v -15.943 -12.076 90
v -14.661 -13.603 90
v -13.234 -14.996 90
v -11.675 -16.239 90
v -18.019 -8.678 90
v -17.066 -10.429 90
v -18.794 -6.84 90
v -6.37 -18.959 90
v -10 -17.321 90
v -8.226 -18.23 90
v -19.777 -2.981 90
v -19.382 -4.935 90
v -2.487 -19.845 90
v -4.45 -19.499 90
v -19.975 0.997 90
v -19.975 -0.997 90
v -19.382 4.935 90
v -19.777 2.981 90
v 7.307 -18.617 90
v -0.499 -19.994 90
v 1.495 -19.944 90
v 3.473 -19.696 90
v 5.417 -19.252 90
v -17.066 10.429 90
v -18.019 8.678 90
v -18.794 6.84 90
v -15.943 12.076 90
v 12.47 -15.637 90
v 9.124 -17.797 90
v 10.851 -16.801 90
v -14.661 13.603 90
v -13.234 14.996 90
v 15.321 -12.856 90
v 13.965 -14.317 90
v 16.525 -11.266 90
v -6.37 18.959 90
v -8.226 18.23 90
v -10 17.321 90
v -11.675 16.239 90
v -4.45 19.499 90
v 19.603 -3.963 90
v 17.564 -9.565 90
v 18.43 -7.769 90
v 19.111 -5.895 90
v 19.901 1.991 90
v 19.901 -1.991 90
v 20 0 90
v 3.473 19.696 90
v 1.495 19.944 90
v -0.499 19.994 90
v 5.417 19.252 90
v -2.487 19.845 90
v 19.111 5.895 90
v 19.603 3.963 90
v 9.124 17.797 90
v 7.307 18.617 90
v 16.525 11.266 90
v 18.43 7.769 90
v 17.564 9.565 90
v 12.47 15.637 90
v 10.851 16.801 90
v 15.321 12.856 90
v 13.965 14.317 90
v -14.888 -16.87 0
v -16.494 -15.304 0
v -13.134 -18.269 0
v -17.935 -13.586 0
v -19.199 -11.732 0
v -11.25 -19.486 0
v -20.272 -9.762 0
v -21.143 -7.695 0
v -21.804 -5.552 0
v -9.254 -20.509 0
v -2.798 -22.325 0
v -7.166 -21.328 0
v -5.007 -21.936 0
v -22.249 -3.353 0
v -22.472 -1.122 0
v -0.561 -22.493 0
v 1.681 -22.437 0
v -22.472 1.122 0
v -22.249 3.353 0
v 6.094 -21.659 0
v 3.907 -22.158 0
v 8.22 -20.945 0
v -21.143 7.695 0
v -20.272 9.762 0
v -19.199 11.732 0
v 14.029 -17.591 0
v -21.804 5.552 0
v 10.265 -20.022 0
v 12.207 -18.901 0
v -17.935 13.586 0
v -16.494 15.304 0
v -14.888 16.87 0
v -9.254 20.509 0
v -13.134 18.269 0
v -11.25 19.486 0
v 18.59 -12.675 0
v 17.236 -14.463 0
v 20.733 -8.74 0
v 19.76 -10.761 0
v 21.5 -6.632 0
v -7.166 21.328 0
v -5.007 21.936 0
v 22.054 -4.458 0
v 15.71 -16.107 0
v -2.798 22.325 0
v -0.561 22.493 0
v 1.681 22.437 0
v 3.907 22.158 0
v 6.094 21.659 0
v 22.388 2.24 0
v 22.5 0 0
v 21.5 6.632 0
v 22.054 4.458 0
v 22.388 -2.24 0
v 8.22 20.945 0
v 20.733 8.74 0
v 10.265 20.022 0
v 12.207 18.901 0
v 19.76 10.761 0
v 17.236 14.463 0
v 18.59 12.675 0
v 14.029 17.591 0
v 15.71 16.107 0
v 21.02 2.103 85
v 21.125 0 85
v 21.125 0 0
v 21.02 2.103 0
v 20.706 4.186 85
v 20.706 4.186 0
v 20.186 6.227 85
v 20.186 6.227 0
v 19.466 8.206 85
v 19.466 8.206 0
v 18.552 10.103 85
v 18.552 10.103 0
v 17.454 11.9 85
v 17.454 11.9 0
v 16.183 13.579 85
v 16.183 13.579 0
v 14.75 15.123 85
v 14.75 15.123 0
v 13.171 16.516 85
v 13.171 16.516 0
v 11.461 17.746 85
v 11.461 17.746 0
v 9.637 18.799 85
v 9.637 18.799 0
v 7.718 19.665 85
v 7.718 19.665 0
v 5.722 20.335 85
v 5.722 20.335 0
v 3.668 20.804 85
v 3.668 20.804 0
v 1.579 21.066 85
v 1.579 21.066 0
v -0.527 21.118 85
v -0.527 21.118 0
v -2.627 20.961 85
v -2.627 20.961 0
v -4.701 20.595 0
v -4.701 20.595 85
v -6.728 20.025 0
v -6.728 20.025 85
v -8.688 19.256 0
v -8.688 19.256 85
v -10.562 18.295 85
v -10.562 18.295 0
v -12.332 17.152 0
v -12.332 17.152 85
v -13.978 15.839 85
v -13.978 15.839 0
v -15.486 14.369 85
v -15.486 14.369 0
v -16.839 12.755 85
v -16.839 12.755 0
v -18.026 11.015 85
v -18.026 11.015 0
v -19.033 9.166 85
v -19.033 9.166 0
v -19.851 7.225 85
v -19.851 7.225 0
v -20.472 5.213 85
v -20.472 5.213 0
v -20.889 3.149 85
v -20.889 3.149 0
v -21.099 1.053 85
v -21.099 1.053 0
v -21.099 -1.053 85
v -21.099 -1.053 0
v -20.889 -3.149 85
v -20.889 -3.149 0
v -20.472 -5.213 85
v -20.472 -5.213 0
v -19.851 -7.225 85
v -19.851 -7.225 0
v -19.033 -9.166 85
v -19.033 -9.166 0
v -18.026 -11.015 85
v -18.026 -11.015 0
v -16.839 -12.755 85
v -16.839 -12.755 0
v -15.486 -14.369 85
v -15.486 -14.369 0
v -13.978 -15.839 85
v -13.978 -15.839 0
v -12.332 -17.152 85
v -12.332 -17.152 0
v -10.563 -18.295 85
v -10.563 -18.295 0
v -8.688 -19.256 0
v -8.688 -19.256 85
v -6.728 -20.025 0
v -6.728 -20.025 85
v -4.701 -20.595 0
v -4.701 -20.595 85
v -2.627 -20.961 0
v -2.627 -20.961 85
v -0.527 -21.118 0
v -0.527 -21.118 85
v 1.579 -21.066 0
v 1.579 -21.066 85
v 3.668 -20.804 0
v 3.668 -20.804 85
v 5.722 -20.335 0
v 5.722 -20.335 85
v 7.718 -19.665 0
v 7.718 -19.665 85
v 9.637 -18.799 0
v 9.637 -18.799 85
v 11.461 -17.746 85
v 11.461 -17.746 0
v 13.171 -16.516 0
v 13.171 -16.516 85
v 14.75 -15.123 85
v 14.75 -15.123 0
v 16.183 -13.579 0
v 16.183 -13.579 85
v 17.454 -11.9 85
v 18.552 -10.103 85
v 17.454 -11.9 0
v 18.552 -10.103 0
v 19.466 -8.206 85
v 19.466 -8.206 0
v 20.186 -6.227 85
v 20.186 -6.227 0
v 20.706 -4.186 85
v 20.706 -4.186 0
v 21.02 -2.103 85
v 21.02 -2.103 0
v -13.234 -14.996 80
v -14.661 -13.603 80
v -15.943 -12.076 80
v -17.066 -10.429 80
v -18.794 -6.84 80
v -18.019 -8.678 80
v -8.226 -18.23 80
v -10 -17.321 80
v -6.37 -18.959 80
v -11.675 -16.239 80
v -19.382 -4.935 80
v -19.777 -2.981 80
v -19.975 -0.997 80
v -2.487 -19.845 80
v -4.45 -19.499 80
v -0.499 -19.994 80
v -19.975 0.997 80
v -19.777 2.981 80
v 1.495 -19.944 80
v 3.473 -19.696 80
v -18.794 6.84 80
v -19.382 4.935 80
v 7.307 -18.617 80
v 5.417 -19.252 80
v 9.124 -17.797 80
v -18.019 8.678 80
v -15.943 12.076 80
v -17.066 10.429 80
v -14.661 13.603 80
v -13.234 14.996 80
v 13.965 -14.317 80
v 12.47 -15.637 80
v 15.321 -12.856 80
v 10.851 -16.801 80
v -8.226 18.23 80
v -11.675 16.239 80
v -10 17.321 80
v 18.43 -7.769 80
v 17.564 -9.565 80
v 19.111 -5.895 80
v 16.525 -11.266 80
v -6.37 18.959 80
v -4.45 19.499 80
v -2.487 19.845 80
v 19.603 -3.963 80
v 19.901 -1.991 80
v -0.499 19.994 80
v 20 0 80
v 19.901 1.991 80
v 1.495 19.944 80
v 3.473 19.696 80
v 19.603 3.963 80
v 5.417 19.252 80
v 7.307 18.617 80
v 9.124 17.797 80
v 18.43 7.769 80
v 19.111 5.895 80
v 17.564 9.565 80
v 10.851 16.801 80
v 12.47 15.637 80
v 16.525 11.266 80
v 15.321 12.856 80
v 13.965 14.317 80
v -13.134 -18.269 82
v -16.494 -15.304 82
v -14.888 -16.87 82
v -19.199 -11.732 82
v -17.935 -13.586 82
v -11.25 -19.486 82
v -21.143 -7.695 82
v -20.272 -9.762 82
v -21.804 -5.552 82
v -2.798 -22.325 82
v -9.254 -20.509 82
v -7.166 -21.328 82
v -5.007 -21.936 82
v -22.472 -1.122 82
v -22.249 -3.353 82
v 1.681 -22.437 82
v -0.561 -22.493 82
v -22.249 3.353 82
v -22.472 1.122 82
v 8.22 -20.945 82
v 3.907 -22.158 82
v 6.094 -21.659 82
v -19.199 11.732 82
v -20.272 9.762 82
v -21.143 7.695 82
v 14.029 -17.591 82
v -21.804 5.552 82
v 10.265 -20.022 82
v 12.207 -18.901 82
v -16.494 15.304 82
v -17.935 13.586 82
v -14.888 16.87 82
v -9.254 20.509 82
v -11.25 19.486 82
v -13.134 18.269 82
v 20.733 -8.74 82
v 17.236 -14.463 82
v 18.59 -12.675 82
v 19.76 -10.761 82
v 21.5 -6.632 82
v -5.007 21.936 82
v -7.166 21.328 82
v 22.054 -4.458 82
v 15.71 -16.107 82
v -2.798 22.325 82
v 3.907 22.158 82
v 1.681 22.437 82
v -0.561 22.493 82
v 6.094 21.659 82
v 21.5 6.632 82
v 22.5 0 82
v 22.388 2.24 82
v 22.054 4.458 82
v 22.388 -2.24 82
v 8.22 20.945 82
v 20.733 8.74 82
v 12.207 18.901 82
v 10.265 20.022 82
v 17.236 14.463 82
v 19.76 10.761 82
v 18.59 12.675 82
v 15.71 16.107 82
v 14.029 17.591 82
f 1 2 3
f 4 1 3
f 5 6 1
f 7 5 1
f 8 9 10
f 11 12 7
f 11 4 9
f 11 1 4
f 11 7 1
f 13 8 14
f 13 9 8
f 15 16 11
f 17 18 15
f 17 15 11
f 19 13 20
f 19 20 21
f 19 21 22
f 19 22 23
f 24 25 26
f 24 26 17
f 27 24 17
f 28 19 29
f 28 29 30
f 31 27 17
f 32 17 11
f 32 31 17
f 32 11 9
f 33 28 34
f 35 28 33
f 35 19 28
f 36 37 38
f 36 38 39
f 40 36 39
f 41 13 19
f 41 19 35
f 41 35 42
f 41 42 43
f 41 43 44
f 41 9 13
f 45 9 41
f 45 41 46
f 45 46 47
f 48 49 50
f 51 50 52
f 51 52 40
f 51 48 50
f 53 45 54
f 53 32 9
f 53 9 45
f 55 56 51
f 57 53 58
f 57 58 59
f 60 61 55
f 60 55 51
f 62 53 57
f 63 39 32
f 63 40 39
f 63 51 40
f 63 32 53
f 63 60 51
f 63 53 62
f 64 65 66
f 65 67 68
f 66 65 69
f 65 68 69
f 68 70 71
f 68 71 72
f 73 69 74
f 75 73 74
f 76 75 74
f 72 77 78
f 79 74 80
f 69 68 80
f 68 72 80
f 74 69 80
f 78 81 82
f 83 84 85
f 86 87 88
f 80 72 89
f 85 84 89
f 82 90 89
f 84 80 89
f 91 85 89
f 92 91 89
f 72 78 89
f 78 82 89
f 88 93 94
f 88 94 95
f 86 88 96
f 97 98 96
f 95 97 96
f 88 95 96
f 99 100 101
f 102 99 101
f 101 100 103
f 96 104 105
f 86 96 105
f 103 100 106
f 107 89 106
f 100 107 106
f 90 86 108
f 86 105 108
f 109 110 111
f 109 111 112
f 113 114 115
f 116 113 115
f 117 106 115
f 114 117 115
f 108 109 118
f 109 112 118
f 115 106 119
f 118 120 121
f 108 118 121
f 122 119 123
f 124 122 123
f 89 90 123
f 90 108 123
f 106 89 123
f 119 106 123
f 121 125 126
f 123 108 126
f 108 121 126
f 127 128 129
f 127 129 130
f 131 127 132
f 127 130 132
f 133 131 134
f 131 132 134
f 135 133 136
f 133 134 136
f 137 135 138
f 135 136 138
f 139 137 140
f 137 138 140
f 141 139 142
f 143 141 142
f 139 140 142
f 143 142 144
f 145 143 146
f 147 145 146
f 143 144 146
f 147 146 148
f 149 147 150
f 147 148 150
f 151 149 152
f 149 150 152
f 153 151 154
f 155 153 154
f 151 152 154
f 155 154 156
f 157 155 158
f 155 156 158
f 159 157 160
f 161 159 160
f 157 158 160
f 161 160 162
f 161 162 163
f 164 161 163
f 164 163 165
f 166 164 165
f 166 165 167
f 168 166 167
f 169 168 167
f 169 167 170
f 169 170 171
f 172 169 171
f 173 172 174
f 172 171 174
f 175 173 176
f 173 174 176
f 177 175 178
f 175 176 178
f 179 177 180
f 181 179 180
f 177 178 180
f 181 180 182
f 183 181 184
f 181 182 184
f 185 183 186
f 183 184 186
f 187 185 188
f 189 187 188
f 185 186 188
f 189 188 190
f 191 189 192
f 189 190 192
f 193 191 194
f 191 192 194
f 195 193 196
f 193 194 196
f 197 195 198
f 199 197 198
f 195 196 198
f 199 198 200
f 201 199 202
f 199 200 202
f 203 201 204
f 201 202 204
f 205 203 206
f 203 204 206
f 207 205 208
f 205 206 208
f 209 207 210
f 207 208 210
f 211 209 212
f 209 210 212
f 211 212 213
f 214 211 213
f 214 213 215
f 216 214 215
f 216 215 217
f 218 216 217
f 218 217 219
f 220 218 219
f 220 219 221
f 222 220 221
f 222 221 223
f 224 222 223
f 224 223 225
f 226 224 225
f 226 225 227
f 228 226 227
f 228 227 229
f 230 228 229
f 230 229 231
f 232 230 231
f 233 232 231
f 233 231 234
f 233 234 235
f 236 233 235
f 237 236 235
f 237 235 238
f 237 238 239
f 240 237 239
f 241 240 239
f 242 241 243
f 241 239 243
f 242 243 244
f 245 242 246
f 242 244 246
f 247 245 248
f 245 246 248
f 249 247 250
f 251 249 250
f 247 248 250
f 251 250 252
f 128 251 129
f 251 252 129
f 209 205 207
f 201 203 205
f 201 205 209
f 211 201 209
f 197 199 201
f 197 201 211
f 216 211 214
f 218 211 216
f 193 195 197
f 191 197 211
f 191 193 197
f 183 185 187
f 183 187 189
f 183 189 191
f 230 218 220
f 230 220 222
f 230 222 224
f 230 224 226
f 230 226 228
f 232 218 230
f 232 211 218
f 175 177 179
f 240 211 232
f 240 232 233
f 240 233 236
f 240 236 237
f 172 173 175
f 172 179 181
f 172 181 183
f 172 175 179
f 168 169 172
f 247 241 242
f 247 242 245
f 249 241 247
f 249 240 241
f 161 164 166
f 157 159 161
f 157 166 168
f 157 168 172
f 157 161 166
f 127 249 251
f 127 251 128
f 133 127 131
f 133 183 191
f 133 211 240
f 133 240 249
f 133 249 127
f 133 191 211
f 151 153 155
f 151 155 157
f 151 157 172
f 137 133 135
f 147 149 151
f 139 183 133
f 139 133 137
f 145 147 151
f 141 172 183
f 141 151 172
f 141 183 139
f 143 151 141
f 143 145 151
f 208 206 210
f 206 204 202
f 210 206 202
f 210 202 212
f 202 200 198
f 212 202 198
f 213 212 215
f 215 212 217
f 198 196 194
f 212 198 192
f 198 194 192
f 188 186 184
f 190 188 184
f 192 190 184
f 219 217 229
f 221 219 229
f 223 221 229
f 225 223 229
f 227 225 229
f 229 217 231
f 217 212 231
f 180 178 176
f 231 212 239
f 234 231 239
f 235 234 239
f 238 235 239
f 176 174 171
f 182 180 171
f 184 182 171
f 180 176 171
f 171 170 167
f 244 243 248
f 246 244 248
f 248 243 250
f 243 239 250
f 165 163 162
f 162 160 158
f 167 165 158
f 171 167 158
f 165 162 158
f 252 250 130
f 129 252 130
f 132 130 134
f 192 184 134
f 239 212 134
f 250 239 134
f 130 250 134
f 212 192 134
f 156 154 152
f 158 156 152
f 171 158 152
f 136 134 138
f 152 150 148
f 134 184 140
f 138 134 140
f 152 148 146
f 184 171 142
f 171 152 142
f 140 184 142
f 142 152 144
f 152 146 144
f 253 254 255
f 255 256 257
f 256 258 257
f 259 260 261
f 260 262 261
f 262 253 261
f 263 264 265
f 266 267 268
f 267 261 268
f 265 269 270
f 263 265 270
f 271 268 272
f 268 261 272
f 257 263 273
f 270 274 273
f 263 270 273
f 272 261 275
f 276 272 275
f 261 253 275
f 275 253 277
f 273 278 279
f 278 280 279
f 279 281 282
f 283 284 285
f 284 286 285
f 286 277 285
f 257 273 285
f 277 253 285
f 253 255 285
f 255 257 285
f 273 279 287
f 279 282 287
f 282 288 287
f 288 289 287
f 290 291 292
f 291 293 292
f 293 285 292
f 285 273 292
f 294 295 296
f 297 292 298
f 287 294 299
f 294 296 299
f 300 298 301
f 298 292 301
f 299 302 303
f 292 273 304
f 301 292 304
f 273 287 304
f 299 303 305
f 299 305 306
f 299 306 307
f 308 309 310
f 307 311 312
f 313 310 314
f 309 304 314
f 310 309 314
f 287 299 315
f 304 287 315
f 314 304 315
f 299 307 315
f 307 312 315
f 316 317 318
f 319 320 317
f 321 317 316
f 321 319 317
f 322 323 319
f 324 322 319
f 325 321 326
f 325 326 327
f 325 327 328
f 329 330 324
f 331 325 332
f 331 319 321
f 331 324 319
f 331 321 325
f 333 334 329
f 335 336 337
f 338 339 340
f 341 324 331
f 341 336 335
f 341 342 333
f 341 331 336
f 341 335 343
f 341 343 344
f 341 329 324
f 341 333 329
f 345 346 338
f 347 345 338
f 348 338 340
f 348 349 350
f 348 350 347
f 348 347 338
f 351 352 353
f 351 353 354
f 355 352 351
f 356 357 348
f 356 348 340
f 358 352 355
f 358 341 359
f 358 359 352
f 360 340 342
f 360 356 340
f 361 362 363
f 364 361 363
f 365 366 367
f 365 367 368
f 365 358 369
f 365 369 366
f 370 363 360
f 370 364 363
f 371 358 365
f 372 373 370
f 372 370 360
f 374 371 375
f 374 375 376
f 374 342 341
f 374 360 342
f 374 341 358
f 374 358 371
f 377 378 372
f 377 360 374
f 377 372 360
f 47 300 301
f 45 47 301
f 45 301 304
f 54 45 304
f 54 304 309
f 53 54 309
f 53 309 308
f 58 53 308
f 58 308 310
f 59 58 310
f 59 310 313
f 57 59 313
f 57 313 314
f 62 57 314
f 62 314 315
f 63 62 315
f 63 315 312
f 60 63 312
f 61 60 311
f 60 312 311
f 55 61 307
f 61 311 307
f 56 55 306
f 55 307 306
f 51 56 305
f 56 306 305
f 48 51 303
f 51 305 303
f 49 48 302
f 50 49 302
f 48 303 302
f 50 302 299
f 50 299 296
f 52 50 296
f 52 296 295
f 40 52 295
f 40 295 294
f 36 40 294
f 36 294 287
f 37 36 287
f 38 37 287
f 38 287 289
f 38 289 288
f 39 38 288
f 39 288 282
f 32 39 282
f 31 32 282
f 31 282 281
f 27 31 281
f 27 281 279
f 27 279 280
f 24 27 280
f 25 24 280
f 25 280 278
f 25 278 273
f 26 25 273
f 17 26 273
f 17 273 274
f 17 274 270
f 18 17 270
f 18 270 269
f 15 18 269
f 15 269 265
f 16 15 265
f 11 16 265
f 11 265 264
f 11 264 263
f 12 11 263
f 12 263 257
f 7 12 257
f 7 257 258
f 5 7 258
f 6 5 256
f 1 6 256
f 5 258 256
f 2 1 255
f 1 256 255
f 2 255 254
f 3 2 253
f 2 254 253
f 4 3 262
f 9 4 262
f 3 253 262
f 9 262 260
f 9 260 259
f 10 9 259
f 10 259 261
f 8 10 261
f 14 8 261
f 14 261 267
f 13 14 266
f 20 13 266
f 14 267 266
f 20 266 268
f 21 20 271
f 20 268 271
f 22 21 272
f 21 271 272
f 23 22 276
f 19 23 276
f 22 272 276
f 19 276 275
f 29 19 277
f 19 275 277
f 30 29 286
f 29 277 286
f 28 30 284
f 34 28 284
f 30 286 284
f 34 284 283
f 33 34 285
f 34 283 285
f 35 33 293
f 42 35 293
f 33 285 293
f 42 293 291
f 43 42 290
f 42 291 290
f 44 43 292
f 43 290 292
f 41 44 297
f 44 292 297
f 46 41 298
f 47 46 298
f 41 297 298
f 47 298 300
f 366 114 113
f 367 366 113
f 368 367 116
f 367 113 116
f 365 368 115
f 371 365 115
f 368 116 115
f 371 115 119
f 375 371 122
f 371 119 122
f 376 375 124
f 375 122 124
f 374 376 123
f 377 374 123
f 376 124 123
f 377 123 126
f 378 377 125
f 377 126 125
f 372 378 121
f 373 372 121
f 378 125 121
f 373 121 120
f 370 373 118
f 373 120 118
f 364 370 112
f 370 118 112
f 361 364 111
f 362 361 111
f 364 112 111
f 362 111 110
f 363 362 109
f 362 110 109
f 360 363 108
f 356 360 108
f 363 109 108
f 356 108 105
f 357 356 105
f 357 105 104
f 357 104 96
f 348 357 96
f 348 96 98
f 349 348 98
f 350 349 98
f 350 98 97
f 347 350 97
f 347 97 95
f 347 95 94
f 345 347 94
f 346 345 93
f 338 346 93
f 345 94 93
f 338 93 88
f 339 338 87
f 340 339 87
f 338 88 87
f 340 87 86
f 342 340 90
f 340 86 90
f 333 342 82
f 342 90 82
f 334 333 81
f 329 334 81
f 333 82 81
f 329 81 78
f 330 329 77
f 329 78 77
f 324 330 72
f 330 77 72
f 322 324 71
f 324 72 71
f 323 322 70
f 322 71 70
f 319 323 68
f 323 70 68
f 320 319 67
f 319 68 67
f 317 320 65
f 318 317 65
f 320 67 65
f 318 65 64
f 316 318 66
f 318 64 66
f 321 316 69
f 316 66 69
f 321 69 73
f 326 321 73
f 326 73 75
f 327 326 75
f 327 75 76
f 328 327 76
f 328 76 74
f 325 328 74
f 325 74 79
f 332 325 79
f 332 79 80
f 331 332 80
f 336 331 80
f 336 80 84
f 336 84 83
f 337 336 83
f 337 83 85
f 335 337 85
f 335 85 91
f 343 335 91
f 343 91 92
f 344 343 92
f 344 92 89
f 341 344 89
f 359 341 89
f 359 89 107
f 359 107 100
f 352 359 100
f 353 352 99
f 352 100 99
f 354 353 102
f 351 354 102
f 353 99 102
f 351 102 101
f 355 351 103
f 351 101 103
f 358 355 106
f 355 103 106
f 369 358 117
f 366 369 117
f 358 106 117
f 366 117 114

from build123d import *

# Parameters (mm, degrees)
CYLINDER001_R     = 22.5
CYLINDER001_DEPTH = 82
CYLINDER002_R     = 21.125
CYLINDER002_DEPTH = 85
CYLINDER_R        = 27
CYLINDER_DEPTH    = 80
CYLINDER003_R     = 20
CYLINDER003_DEPTH = 90


with BuildPart() as vacinner:
    # Cylinder001 → Cylinder001 (new body)
    with BuildSketch(Plane.XY):
        Circle(CYLINDER001_R)
    extrude(amount=CYLINDER001_DEPTH)


with BuildPart() as scieinner:
    # Cylinder002 → Cylinder002 (new body)
    with BuildSketch(Plane.XY):
        Circle(CYLINDER002_R)
    extrude(amount=CYLINDER002_DEPTH)


with BuildPart() as vacouter:
    # Cylinder → Cylinder (new body)
    with BuildSketch(Plane.XY):
        Circle(CYLINDER_R)
    extrude(amount=CYLINDER_DEPTH)


with BuildPart() as cut:
    # Cylinder003 → Cylinder003 (new body)
    with BuildSketch(Plane.XY):
        Circle(CYLINDER003_R)
    extrude(amount=CYLINDER003_DEPTH)

    # Cut: cut VacOuter
    add(vacouter.part, mode=Mode.SUBTRACT)


solid = Compound([vacinner.part, scieinner.part, cut.part])
